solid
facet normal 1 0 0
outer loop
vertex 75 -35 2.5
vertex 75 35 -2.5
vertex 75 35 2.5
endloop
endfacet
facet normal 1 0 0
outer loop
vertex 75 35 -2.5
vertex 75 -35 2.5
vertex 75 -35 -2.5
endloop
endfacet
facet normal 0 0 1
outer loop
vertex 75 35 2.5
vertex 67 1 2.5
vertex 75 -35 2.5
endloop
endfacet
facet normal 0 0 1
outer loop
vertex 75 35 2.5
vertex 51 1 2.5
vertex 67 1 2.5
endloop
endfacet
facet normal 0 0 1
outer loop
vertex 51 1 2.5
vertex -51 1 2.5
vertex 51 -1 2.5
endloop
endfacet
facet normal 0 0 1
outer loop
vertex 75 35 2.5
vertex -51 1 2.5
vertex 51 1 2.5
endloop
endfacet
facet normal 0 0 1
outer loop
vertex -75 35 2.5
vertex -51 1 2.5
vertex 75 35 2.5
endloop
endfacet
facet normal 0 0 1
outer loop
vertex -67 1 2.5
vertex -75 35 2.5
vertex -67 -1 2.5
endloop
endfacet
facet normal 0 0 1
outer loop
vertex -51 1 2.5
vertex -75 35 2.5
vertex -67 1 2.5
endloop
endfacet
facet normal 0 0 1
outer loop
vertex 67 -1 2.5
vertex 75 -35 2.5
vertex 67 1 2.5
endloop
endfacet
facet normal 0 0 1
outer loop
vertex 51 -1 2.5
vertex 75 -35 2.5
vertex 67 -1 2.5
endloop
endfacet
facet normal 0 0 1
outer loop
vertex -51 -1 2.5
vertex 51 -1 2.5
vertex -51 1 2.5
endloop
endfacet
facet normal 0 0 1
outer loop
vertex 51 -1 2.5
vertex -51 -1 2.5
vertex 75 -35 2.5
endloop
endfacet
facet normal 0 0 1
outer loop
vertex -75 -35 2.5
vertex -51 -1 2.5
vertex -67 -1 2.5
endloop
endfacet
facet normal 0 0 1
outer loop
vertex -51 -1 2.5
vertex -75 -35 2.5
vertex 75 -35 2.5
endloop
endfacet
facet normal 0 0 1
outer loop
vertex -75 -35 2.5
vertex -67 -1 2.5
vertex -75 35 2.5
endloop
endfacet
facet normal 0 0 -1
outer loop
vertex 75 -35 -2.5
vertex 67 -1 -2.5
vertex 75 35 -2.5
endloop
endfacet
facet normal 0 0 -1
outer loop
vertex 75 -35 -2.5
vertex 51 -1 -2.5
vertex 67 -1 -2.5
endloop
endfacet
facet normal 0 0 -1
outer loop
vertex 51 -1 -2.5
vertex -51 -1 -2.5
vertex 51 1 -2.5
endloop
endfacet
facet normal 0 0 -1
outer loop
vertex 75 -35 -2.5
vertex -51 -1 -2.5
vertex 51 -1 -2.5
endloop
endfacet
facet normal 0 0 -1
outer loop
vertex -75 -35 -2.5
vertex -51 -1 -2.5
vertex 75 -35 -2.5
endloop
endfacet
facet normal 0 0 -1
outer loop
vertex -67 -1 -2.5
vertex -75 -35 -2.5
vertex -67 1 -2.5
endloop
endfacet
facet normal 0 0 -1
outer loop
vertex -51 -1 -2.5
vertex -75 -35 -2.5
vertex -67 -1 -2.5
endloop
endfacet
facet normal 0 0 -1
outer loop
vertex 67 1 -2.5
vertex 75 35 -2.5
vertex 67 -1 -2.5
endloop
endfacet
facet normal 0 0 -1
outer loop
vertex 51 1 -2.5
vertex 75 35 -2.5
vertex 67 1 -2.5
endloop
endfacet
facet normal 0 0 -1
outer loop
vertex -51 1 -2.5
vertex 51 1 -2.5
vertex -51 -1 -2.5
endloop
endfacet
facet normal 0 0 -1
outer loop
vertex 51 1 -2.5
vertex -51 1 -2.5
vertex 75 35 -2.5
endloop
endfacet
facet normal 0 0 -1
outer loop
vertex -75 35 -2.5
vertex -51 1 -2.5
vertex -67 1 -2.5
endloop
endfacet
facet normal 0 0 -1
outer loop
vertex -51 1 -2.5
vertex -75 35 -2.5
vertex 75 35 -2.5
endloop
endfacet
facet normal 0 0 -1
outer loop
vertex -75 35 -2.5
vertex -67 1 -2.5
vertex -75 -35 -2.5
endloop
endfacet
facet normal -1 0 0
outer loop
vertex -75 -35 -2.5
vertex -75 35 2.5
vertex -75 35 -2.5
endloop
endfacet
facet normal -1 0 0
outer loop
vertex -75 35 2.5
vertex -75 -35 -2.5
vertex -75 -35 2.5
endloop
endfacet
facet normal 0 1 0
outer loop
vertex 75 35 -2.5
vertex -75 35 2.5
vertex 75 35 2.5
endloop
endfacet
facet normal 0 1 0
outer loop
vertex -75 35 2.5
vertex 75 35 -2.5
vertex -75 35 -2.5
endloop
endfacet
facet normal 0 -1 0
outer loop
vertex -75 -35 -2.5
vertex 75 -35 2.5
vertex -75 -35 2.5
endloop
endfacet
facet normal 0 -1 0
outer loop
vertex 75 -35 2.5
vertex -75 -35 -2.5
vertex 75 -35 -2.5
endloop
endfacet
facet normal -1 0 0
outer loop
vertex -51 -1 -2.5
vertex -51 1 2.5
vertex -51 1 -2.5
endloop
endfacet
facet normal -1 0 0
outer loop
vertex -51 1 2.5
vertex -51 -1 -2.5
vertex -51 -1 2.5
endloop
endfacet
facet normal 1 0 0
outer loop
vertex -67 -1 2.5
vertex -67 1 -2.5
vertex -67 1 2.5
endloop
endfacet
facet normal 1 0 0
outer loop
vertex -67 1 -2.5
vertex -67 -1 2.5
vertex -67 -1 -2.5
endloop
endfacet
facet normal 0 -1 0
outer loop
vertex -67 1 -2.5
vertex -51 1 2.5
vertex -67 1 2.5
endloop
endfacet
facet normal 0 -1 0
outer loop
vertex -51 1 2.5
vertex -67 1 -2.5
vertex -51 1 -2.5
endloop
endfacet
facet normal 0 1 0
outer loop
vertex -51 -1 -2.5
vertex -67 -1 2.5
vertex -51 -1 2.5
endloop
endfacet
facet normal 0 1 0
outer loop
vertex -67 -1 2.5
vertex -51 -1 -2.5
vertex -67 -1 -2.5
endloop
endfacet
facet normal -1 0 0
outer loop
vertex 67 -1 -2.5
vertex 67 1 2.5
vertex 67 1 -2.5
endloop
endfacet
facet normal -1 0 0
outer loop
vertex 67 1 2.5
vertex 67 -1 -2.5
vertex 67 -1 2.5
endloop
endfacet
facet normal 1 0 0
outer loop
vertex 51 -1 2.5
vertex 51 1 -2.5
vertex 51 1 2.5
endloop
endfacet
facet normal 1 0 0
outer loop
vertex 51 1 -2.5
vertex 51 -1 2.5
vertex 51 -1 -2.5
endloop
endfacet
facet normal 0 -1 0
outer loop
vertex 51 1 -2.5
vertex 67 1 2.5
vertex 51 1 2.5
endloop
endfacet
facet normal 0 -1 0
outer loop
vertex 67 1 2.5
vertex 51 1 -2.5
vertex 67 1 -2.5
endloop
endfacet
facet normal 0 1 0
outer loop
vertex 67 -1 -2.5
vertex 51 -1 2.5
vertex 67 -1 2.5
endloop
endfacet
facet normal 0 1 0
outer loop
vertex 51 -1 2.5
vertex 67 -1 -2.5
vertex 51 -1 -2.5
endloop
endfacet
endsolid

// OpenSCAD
// ========================================
// a 15 x 7 x 0.5 cm plate with two 1.6 x 0.2 cm slots
// NeuroCAD canonical IR; dimensions are millimetres
// ========================================
$fn = 48;

difference() {
  cube(size=[150, 70, 5], center=true);
  translate([-59, 0, 0]) {
    cube(size=[16, 2, 7], center=true);
  }
  translate([59, 0, 0]) {
    cube(size=[16, 2, 7], center=true);
  }
}
